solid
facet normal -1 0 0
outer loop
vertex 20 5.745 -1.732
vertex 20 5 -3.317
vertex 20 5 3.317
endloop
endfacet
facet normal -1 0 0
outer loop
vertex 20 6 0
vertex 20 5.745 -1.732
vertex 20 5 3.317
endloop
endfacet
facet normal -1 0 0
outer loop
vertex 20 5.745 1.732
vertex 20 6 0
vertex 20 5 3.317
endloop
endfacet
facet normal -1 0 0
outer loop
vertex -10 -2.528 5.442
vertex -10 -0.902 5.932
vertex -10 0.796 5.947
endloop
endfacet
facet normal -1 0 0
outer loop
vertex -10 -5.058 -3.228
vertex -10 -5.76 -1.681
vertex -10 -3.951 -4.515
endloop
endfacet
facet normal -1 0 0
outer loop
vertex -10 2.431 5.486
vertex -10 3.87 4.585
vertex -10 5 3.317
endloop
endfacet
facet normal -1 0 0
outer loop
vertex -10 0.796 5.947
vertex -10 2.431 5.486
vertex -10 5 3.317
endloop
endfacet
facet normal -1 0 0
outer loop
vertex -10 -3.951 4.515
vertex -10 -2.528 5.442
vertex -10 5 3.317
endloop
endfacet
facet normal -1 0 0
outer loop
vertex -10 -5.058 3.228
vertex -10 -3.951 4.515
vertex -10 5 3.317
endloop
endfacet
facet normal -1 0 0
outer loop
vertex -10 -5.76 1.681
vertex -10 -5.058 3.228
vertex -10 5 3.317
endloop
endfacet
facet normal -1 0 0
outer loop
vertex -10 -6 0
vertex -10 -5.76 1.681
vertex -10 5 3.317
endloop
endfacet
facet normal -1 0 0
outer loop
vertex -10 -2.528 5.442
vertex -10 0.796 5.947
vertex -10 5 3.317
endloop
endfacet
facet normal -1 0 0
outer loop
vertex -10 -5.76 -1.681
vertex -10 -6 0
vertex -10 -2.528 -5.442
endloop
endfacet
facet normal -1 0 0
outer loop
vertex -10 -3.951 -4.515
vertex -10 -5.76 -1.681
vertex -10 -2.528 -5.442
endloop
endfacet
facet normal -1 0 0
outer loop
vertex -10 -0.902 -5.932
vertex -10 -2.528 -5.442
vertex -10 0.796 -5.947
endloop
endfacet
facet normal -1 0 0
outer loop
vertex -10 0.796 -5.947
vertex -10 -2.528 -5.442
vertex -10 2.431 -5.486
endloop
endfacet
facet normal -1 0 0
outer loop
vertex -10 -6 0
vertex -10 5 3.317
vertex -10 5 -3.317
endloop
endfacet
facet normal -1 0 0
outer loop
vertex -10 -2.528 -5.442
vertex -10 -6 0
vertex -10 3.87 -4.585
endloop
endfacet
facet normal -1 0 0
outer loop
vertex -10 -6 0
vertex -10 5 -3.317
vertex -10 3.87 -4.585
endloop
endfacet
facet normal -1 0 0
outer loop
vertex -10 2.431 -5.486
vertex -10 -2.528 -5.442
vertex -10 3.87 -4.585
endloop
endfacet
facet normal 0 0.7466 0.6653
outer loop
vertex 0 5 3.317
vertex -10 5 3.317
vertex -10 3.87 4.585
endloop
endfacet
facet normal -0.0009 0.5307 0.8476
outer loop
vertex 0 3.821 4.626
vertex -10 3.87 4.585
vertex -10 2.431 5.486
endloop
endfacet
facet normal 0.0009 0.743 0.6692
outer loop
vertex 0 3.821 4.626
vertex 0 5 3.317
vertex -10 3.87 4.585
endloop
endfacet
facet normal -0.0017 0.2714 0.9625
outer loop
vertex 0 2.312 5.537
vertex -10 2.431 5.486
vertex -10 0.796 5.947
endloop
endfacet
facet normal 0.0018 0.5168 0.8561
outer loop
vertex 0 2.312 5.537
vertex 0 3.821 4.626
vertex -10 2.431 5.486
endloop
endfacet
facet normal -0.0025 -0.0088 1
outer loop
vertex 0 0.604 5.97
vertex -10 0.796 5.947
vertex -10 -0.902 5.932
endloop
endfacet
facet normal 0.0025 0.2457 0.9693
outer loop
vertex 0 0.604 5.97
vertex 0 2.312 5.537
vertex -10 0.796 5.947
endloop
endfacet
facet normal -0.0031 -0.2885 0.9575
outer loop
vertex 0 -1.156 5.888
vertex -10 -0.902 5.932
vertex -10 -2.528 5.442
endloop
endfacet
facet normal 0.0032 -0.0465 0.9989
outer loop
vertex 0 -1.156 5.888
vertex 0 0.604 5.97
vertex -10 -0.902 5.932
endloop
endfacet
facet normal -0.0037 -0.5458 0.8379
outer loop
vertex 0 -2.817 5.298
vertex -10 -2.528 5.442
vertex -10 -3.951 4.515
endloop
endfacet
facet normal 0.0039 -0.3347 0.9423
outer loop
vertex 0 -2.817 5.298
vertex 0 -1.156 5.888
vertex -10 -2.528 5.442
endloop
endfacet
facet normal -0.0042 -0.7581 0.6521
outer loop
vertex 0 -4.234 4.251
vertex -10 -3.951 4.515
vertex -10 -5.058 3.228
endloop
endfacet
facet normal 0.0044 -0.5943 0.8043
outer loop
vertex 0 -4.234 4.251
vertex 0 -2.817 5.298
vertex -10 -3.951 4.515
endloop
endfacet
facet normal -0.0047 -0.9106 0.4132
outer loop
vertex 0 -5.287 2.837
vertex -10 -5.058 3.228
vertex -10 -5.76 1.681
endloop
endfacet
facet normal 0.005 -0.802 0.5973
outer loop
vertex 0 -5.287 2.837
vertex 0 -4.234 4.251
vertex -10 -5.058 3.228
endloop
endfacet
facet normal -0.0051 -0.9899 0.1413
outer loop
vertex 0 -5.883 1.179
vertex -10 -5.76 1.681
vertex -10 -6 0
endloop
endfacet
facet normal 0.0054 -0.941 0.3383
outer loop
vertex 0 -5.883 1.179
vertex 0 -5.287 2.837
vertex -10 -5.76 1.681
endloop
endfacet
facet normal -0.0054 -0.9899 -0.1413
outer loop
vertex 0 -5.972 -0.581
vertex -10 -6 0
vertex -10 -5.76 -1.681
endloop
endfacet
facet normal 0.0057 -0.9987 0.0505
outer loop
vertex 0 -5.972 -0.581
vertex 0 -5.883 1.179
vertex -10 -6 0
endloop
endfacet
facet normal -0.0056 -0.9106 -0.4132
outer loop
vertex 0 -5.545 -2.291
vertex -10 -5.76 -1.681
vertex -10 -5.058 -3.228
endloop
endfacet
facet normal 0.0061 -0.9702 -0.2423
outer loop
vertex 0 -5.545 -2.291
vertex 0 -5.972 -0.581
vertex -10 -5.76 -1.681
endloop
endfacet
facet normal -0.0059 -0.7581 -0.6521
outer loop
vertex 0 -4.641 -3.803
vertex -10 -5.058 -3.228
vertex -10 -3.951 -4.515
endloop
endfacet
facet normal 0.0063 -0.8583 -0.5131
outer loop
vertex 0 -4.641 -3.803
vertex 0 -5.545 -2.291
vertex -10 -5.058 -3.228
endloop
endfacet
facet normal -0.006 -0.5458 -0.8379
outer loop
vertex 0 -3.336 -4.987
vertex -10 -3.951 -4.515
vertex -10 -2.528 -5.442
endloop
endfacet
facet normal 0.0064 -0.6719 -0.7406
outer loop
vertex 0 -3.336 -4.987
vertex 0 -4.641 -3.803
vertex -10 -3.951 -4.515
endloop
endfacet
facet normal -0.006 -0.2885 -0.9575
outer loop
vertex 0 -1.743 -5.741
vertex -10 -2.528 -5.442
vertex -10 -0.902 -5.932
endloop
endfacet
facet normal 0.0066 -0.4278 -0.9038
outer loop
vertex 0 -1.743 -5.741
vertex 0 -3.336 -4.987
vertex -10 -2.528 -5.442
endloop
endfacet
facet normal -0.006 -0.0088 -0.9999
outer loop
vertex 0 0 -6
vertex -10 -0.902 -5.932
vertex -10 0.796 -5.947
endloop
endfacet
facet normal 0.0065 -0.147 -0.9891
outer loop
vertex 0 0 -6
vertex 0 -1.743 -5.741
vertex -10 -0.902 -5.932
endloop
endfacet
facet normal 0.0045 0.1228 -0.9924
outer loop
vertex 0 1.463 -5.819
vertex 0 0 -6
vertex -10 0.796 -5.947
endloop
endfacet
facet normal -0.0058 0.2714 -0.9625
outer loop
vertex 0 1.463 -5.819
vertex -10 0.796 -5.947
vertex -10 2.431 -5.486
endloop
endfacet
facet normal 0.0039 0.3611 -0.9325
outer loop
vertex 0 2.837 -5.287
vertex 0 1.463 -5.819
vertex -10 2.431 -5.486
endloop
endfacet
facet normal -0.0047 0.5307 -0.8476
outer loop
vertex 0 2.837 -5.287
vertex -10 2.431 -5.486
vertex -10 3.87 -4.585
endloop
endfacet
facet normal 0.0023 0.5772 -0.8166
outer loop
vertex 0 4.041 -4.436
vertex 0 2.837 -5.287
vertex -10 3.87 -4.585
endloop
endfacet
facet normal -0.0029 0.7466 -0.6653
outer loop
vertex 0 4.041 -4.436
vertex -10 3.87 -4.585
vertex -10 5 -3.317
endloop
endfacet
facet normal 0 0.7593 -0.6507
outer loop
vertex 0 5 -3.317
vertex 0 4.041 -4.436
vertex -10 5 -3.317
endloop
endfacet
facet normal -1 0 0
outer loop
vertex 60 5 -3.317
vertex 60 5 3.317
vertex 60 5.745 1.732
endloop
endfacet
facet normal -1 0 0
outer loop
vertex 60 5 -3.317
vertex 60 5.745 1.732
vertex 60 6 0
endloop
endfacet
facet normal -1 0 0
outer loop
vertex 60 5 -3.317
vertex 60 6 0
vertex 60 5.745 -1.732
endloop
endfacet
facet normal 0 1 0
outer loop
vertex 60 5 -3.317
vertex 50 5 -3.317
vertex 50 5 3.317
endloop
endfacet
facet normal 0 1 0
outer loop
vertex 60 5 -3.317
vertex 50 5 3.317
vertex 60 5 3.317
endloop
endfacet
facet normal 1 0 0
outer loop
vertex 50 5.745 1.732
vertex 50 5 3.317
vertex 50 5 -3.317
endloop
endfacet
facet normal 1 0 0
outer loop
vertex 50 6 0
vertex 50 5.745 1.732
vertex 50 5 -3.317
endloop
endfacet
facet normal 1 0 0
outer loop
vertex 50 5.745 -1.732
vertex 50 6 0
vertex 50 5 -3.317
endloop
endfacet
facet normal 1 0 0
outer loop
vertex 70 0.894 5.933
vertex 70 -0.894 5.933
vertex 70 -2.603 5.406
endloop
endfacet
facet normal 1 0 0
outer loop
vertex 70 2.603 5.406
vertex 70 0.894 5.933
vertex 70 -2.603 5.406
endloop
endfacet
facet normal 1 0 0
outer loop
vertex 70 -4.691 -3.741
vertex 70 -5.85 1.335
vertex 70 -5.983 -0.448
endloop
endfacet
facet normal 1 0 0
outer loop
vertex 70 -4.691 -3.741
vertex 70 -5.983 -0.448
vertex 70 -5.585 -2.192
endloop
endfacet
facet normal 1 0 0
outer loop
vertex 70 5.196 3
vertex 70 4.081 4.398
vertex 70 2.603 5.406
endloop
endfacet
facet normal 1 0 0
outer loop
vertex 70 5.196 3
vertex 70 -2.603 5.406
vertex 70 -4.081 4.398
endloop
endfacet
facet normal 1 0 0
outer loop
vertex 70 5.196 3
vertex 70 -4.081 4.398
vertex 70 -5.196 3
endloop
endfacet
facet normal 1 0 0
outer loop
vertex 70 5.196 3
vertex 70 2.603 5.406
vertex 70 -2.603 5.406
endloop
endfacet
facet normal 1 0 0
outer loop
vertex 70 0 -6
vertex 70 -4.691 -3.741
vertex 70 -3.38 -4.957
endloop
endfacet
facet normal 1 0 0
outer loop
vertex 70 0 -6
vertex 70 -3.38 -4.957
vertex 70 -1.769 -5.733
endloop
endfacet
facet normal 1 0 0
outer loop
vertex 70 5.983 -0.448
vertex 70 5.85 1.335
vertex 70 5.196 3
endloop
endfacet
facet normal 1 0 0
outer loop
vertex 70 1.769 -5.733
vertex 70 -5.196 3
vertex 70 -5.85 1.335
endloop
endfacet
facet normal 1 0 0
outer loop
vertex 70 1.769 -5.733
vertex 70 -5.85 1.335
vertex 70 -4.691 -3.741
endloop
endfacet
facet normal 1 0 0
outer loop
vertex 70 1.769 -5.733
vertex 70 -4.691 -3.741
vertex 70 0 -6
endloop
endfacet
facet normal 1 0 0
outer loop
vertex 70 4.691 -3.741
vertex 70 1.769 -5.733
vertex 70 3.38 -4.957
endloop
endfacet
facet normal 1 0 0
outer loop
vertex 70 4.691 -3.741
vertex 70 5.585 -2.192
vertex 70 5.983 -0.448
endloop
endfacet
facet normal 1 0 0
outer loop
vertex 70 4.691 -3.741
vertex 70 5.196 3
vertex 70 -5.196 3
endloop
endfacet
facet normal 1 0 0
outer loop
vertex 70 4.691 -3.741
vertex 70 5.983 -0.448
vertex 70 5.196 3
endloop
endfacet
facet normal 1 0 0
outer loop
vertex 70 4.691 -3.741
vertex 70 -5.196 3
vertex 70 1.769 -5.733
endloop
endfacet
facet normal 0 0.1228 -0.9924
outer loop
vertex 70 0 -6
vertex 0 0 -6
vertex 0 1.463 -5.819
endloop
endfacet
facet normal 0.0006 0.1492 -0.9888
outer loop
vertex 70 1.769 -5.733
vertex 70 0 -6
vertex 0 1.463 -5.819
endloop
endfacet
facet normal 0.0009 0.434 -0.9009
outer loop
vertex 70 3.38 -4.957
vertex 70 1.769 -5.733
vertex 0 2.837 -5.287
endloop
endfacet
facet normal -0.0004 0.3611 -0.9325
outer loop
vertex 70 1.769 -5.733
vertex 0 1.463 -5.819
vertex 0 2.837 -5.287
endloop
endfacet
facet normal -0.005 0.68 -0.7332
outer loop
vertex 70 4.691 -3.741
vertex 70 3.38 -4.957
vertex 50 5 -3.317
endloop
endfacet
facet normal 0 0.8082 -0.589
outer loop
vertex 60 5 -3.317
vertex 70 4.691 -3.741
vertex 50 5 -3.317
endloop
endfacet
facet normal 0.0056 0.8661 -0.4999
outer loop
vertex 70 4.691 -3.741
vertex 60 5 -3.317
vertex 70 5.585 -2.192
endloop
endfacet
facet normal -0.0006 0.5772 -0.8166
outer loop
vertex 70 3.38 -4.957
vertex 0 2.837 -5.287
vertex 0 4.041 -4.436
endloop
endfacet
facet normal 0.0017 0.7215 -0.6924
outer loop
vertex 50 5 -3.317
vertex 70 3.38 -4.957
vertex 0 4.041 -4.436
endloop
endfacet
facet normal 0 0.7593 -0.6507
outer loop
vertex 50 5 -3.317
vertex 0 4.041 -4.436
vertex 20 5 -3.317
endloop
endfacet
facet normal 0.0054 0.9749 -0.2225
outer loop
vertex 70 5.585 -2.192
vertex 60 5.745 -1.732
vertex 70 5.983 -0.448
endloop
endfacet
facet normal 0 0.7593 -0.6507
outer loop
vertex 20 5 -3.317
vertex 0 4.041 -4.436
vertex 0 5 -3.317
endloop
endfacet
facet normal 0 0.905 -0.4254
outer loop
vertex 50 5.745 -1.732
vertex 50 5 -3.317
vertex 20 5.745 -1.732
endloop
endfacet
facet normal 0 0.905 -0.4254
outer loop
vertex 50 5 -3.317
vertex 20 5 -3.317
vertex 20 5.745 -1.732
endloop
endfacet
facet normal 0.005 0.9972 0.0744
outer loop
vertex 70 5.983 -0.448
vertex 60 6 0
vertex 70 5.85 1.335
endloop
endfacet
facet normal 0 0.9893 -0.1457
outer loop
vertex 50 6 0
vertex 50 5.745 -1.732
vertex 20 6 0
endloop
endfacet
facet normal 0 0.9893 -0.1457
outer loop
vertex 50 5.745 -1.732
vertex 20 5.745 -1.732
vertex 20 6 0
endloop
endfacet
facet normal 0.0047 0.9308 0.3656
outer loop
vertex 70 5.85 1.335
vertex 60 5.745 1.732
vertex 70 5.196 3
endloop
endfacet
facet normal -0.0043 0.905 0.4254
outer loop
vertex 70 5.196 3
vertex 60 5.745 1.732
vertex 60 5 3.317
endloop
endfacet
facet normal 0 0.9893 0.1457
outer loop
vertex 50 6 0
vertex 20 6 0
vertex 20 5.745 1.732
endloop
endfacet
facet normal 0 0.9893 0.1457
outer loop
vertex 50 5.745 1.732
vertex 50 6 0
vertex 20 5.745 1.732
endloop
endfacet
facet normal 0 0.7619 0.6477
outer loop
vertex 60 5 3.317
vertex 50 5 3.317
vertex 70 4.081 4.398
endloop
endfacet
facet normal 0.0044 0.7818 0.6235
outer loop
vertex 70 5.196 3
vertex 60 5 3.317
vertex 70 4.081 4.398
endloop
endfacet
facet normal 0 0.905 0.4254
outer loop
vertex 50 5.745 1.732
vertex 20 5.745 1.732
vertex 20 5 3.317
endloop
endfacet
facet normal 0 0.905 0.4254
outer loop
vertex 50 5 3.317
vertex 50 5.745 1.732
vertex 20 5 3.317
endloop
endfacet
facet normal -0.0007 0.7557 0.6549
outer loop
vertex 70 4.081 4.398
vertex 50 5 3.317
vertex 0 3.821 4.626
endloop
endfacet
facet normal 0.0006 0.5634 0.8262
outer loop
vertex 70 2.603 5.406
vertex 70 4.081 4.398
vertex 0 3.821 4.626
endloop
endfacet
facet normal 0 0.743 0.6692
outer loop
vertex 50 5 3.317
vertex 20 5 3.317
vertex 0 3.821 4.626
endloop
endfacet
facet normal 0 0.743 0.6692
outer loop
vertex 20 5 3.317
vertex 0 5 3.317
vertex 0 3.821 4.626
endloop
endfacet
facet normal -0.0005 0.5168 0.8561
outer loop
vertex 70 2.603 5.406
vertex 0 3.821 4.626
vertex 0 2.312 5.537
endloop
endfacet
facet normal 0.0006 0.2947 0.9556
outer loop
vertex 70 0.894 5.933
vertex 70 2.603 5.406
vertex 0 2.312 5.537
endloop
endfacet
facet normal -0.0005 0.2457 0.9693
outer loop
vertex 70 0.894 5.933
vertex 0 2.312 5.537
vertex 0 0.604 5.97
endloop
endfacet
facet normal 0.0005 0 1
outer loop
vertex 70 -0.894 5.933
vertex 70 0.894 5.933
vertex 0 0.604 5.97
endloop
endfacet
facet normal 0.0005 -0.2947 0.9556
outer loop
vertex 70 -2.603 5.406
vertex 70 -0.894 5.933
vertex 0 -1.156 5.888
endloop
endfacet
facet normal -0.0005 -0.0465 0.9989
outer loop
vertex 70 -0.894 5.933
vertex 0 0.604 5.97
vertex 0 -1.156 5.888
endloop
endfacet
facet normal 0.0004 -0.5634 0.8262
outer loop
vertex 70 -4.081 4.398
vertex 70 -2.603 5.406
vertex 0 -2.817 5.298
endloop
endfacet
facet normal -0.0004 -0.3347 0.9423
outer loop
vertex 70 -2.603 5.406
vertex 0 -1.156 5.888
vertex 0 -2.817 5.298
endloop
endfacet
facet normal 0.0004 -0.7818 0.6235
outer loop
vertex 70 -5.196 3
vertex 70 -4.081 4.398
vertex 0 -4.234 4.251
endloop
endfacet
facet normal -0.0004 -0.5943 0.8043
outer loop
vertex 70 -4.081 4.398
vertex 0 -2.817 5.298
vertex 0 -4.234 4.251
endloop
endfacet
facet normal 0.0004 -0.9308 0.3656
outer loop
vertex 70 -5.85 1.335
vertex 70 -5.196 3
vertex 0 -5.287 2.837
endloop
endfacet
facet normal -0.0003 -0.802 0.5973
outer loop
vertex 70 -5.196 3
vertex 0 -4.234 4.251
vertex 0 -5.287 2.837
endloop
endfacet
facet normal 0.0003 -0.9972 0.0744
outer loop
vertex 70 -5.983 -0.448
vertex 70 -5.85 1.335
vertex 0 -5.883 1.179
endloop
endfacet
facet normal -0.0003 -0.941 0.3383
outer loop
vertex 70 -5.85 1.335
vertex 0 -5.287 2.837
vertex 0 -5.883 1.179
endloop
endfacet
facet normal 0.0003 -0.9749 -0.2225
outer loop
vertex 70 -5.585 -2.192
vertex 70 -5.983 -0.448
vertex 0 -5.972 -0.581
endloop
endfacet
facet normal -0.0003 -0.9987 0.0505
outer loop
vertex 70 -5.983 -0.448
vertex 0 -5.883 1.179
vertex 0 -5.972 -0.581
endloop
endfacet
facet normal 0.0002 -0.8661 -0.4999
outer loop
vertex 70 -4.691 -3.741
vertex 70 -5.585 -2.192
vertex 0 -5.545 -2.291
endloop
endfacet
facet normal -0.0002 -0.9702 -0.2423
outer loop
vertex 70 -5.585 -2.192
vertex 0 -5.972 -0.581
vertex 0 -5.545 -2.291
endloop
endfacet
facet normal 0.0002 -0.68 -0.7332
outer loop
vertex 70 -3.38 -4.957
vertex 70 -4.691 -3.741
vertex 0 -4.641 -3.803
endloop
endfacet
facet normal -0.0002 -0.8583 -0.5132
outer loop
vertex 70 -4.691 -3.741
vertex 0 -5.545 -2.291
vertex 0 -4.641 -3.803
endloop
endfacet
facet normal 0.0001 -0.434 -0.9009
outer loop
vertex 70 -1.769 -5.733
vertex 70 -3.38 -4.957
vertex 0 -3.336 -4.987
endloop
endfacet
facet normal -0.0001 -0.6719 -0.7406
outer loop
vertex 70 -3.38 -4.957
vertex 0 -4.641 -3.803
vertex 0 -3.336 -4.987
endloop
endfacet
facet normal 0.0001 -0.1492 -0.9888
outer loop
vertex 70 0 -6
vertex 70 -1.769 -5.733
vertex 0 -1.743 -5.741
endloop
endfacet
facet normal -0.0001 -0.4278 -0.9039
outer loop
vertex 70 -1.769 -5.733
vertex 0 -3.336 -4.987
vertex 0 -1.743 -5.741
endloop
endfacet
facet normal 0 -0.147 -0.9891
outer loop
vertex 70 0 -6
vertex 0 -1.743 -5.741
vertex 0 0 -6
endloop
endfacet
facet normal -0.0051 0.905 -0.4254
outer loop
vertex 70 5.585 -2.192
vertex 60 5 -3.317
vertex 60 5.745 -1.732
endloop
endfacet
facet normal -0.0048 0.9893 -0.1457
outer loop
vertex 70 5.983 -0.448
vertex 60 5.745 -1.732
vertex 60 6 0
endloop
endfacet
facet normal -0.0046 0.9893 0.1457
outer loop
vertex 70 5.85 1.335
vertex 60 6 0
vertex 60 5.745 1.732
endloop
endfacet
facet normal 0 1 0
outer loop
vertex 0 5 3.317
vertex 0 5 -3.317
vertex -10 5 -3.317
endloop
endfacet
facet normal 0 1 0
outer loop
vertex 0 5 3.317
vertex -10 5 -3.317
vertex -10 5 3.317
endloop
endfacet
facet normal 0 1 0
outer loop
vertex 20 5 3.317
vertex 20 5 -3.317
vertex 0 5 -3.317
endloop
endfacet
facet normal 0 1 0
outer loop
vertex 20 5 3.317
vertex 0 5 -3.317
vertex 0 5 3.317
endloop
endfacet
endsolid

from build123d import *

# Parameters (mm, degrees)
SKETCH_1_R          = 6
EXTRUDE_1_DEPTH     = 70
SKETCH_2_W          = 10
SKETCH_2_H          = 1
SKETCH_2_W_2        = 20
CUT_EXTRUDE_1_DEPTH = 35
EXTRUDE_2_DEPTH     = 10


with BuildPart() as part:
    # 草图1 → 凸台-拉伸1 (new body)
    with BuildSketch(Plane(origin=(0, 0, 0), x_dir=(0, 0, -1), z_dir=(1, 0, 0))):
        Circle(SKETCH_1_R)
    extrude(amount=EXTRUDE_1_DEPTH)

    # 草图2 → 切除-拉伸1 (cut, symmetric)
    with BuildSketch(Plane.XY):
        with Locations((55, 5.5)):
            Rectangle(SKETCH_2_W, SKETCH_2_H)
        with Locations((10, 5.5)):
            Rectangle(SKETCH_2_W_2, SKETCH_2_H)
    extrude(amount=CUT_EXTRUDE_1_DEPTH, both=True, mode=Mode.SUBTRACT)

    # 草图3 → 凸台-拉伸2 (add)
    with BuildSketch(Plane.ZY):
        with BuildLine():
            Line((-3.31662479, 5), (3.31662479, 5))
            ThreePointArc((3.31662479, 5), (0, -6), (-3.31662479, 5))
        make_face()
    extrude(amount=EXTRUDE_2_DEPTH)


solid = part.part
